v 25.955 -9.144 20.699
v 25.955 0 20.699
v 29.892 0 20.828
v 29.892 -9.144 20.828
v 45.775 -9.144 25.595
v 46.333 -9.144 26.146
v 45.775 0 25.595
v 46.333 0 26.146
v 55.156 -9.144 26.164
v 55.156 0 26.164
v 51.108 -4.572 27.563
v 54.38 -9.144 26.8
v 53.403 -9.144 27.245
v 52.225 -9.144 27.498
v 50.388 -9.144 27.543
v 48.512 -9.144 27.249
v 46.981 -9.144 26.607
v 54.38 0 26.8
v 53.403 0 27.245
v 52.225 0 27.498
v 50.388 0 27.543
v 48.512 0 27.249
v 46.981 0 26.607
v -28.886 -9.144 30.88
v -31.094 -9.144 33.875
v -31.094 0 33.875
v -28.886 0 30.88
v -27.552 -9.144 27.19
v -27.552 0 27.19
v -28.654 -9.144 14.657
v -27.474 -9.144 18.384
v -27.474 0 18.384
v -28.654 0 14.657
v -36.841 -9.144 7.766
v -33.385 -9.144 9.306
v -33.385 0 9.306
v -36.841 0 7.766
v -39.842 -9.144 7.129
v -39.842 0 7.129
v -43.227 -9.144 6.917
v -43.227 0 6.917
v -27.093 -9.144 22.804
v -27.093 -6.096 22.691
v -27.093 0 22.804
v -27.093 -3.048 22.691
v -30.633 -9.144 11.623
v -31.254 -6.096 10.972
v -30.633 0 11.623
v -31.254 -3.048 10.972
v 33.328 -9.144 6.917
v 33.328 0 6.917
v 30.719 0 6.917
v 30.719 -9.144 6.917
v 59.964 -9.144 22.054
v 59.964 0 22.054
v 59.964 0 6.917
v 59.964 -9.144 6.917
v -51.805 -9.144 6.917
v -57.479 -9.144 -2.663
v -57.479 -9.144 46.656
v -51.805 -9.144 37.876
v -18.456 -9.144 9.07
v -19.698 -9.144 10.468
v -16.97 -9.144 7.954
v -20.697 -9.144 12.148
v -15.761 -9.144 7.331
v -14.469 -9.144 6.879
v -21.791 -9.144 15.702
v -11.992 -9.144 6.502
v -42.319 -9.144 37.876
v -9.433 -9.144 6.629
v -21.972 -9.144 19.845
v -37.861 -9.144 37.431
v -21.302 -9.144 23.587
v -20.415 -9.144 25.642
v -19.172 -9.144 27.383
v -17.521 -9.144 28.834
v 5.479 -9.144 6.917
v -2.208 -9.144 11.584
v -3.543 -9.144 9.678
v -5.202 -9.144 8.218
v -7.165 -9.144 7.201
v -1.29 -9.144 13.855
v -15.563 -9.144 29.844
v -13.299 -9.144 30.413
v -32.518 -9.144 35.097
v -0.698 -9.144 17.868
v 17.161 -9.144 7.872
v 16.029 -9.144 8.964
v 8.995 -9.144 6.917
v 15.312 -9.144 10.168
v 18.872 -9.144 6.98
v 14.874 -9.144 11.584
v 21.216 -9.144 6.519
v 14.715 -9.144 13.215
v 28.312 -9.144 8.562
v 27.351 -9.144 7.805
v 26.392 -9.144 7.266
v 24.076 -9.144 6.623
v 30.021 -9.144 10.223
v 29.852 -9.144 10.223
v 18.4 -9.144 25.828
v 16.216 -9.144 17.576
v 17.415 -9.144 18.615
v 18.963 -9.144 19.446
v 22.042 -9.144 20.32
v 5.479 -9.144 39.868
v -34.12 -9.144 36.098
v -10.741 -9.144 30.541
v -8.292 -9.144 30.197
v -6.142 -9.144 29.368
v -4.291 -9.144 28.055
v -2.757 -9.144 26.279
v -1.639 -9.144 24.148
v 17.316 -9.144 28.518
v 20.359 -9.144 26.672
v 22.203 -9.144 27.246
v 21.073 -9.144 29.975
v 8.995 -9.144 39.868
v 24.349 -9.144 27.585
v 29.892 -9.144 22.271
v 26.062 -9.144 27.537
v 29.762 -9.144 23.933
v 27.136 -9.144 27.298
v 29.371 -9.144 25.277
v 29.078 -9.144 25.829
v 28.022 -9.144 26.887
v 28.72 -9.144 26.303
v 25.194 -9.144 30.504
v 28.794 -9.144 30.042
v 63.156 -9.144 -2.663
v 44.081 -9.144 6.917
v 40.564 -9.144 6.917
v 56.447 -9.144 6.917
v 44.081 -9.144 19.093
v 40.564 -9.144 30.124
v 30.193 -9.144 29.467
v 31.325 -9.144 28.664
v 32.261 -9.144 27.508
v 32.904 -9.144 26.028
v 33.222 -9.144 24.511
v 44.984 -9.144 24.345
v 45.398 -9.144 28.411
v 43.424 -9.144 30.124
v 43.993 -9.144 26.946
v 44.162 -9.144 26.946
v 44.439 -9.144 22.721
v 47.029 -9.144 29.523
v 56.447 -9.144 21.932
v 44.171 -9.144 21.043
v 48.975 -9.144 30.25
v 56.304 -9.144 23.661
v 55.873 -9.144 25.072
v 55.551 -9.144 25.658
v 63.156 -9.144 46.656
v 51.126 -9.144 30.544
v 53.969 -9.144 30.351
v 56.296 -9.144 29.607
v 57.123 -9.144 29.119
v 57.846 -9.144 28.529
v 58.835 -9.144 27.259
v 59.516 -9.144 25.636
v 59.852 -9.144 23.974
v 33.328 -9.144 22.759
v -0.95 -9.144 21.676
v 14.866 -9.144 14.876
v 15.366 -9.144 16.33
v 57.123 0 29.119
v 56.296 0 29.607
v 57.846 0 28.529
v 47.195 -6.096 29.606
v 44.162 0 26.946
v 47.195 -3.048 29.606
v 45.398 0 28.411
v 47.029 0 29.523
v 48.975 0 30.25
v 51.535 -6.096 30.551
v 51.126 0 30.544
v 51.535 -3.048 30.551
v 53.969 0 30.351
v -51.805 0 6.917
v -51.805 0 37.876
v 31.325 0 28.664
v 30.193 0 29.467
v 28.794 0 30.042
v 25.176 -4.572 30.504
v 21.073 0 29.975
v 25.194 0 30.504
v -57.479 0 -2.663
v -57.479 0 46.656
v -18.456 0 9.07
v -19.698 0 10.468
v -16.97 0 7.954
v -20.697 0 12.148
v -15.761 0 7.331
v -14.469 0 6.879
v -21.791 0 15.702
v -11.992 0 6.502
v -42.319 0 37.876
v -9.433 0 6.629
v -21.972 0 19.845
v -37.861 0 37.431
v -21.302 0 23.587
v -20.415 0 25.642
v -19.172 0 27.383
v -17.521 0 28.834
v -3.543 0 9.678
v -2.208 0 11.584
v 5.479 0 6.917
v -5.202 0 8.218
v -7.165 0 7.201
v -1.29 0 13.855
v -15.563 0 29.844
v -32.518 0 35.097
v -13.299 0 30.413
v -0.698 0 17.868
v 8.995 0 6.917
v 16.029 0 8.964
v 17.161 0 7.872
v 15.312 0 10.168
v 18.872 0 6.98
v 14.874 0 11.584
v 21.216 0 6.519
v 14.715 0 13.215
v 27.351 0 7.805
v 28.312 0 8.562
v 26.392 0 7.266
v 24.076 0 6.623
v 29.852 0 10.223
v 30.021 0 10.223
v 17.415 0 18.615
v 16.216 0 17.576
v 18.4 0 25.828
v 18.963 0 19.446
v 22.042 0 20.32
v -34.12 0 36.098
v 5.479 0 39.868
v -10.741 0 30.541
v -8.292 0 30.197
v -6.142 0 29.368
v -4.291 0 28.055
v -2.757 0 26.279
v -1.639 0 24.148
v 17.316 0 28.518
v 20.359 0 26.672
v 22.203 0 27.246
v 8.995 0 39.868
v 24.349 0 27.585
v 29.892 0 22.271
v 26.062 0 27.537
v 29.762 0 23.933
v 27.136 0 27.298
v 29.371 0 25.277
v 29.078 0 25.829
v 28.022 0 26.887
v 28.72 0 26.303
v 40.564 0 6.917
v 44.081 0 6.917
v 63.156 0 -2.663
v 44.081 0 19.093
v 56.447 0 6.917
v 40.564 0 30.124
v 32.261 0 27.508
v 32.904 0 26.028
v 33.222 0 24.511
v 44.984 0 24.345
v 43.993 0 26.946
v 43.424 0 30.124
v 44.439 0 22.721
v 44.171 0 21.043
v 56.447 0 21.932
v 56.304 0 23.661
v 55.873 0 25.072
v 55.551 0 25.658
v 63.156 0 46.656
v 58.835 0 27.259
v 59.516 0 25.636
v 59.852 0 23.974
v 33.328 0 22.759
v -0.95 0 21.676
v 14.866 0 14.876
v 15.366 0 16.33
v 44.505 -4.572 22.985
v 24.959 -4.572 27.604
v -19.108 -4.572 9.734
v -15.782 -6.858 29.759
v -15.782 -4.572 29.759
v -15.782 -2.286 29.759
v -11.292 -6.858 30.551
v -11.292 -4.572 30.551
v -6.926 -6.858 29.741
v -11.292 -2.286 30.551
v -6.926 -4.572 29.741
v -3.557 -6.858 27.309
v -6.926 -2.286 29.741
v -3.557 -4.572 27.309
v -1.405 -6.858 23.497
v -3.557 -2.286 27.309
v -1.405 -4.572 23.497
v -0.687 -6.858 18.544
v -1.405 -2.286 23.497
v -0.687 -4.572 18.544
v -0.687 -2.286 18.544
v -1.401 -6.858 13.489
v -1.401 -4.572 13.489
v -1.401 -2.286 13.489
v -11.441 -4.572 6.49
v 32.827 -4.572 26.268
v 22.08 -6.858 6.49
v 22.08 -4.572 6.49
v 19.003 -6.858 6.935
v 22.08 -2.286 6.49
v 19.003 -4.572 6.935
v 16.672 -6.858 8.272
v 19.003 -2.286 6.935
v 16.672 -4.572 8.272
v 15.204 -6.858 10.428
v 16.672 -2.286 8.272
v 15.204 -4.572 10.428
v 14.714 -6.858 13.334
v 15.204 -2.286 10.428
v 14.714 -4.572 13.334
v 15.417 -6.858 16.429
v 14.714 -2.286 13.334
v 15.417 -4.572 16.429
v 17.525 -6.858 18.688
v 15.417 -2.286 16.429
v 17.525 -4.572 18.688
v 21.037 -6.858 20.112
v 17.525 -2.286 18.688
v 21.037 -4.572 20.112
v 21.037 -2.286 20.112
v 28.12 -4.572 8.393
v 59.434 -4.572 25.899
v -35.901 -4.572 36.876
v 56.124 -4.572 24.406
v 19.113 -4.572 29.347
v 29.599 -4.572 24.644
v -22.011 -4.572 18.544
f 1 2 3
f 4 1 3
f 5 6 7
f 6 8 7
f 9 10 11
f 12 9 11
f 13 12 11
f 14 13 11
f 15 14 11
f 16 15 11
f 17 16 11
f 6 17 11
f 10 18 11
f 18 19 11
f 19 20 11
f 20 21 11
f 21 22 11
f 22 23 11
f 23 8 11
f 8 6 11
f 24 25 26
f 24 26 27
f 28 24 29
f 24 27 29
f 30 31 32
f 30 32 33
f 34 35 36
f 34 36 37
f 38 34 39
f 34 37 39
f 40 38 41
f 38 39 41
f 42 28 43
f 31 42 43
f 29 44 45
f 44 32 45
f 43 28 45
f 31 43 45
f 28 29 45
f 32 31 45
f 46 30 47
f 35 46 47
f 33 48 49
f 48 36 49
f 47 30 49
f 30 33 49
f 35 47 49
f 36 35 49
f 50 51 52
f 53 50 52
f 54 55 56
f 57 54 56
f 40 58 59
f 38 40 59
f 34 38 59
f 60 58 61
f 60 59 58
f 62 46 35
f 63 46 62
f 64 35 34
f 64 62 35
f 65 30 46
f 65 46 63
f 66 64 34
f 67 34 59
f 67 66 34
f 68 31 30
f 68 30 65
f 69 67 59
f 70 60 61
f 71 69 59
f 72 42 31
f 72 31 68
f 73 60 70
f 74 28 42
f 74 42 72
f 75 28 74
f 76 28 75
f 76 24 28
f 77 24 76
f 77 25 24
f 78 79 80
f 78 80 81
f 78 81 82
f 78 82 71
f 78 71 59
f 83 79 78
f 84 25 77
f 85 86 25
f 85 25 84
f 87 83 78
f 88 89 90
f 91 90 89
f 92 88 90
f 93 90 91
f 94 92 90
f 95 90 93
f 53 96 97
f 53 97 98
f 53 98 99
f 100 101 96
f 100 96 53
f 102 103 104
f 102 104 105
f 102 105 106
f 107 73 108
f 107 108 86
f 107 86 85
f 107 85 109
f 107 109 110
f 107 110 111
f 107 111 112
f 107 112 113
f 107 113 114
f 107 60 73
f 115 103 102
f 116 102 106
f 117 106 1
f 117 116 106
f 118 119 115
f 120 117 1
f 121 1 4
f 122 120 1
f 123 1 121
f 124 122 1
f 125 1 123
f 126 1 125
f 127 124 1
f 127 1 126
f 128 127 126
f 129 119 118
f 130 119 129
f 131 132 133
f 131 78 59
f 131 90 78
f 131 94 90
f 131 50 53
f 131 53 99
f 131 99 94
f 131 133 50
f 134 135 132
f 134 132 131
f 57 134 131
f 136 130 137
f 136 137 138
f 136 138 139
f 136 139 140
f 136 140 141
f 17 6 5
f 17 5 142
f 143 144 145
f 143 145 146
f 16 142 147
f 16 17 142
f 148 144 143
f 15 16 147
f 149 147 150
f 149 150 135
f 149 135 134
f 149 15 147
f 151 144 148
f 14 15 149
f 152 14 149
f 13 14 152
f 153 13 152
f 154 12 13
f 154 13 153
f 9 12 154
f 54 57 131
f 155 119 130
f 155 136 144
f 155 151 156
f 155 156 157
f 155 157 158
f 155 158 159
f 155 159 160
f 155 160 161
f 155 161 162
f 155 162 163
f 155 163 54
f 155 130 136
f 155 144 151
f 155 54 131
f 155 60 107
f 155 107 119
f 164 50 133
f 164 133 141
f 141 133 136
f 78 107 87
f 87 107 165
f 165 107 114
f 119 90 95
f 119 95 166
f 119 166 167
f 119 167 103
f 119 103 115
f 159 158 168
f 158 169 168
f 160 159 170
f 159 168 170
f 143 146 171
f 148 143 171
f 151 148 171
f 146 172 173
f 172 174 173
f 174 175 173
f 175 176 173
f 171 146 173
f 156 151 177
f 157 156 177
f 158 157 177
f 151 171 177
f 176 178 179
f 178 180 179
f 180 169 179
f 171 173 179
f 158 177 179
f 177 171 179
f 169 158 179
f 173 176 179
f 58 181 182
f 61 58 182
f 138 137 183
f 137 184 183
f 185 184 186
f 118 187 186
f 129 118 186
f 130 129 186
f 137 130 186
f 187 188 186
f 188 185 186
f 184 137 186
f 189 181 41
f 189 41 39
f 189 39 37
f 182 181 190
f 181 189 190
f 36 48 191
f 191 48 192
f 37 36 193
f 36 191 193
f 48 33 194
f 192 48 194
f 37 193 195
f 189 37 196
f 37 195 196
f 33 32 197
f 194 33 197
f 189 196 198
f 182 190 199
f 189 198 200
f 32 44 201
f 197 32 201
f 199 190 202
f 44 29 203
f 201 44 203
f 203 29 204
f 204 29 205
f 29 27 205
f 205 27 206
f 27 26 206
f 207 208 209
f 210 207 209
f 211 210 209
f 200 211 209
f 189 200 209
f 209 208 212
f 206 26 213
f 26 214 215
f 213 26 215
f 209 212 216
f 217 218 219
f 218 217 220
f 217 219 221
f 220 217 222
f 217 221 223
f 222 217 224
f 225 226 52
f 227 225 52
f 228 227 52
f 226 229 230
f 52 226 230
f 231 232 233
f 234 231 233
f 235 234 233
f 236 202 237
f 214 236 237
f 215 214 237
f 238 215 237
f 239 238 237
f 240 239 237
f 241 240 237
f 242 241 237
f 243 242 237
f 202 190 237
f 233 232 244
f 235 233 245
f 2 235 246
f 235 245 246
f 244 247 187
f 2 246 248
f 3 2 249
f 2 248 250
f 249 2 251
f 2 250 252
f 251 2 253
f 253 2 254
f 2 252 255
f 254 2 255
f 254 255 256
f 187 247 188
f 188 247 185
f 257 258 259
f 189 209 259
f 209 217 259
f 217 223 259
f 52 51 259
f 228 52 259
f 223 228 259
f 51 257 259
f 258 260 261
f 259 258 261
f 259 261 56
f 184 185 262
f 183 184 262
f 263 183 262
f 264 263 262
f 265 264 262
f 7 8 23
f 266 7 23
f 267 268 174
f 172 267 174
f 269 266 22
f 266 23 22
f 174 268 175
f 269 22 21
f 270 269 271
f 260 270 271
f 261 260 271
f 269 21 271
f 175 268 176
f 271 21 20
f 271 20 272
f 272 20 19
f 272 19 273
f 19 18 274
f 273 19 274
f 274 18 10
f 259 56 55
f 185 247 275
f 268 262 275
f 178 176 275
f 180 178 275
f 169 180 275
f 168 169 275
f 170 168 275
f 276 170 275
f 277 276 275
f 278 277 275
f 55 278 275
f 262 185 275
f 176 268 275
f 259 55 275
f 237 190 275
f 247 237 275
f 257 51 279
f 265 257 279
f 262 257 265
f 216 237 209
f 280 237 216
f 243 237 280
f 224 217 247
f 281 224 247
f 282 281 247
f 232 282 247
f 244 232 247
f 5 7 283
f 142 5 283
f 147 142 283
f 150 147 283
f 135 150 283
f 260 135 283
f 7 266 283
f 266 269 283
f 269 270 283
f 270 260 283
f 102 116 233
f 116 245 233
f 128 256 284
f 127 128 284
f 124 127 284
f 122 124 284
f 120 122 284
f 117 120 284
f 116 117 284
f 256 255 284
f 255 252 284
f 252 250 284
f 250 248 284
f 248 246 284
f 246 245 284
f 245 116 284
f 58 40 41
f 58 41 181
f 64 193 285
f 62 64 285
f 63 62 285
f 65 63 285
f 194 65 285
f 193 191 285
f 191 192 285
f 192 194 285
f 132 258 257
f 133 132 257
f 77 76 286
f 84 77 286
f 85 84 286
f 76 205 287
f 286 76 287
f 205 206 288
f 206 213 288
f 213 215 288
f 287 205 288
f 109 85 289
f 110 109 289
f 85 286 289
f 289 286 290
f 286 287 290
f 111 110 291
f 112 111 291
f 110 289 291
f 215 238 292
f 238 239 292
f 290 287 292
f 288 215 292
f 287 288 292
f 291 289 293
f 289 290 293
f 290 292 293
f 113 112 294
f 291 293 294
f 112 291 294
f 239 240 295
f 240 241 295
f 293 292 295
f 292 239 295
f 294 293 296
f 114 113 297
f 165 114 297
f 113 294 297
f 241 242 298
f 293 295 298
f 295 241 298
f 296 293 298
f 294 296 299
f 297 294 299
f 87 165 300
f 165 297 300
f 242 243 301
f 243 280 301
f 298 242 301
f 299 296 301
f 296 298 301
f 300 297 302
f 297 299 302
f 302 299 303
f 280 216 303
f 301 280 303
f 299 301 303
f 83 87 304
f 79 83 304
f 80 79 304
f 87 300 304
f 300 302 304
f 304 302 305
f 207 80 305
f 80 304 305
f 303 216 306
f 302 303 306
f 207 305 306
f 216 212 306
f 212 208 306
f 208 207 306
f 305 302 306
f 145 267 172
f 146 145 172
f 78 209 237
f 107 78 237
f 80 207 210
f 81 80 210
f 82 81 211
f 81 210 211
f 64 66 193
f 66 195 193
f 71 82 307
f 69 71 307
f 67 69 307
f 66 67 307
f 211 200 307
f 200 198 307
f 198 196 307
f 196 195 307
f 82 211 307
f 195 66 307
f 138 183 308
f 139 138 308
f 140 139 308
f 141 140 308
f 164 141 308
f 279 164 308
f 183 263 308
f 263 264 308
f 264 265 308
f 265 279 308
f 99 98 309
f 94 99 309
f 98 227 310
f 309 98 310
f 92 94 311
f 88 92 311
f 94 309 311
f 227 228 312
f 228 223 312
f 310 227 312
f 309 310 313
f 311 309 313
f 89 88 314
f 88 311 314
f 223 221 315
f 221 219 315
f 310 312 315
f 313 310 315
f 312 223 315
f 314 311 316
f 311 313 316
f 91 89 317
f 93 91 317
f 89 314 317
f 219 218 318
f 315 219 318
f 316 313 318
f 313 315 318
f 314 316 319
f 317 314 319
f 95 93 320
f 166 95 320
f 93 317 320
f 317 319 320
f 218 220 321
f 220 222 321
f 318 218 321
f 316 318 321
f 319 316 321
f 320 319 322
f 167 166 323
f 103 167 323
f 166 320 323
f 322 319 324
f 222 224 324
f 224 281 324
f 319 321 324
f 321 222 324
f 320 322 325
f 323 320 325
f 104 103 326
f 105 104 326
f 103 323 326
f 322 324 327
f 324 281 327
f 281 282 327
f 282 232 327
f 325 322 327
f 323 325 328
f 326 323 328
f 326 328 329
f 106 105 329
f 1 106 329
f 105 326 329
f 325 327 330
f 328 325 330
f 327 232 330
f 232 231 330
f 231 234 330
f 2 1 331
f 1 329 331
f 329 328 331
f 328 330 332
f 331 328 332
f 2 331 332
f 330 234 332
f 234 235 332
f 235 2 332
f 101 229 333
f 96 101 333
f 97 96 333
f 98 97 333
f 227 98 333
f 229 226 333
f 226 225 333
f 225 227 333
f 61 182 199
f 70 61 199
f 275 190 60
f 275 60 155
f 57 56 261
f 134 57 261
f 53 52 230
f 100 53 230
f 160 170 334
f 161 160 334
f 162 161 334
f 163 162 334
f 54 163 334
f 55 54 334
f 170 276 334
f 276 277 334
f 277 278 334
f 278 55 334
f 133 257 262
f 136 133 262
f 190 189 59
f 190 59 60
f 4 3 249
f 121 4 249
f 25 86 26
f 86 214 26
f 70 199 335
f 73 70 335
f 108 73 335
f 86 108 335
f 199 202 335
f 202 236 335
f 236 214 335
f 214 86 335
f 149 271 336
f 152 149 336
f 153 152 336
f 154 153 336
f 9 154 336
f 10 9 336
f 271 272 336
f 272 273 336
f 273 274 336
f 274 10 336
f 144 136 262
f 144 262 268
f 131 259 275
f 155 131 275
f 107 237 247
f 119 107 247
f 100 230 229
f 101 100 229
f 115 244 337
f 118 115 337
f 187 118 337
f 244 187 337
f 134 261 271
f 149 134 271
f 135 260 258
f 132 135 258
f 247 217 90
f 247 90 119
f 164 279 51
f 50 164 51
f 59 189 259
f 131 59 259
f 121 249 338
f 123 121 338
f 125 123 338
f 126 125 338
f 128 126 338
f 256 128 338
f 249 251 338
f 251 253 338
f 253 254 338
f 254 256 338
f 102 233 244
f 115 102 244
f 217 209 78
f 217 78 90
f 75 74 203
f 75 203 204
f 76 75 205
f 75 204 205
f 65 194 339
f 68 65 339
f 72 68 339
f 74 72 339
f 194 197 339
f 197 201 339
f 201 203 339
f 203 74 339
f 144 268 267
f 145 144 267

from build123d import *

# Parameters (mm, degrees)
F0_W     = 120.6359267235
F0_H     = 49.3188030086
F0_W_2   = 3.5166996237
F0_H_2   = 32.9512721967
F1_DEPTH = 9.144


with BuildPart() as f1:
    # F0 (on Front) → F1 (new body)
    with BuildSketch(Plane.XZ):
        with Locations((2.8384923935, 21.9962981064)):
            Rectangle(F0_W, F0_H)
        with BuildLine():
            add(Edge.make_bspline(
                [(-3.5570494323, 27.3089231075), (-0.687449643, 24.0666480209), (-0.687449643, 18.5442777062)],
                knots=[0, 0, 0, 1, 1, 1], degree=2))
            add(Edge.make_bspline(
                [(-0.687449643, 18.5442777062), (-0.687449643, 12.8660613581), (-3.5434976033, 9.6779935875)],
                knots=[0, 0, 0, 1, 1, 1], degree=2))
            add(Edge.make_bspline(
                [(-3.5434976033, 9.6779935875), (-6.3995455636, 6.4899258168), (-11.440825949, 6.4899258168)],
                knots=[0, 0, 0, 1, 1, 1], degree=2))
            add(Edge.make_bspline(
                [(-11.440825949, 6.4899258168), (-14.5577466175, 6.4899258168), (-16.9699721782, 7.9535233481)],
                knots=[0, 0, 0, 1, 1, 1], degree=2))
            add(Edge.make_bspline(
                [(-16.9699721782, 7.9535233481), (-19.382197739, 9.4171208793), (-20.6967251513, 12.1478144214)],
                knots=[0, 0, 0, 1, 1, 1], degree=2))
            add(Edge.make_bspline(
                [(-20.6967251513, 12.1478144214), (-22.0112525637, 14.8785079636), (-22.0112525637, 18.5442777062)],
                knots=[0, 0, 0, 1, 1, 1], degree=2))
            add(Edge.make_bspline(
                [(-22.0112525637, 18.5442777062), (-22.0112525637, 24.2157181398), (-19.1721443896, 27.3834581669)],
                knots=[0, 0, 0, 1, 1, 1], degree=2))
            add(Edge.make_bspline(
                [(-19.1721443896, 27.3834581669), (-16.3330362156, 30.5511981941), (-11.2917558301, 30.5511981941)],
                knots=[0, 0, 0, 1, 1, 1], degree=2))
            add(Edge.make_bspline(
                [(-11.2917558301, 30.5511981941), (-6.4266492216, 30.5511981941), (-3.5570494323, 27.3089231075)],
                knots=[0, 0, 0, 1, 1, 1], degree=2))
        make_face(mode=Mode.SUBTRACT)
        with BuildLine():
            Line((33.3276411297, 6.9168084301), (30.7189140485, 6.9168084301))
            Line((30.7189140485, 6.9168084301), (30.0209948554, 10.2234547044))
            Line((30.0209948554, 10.2234547044), (29.851596993, 10.2234547044))
            add(Edge.make_bspline(
                [(29.851596993, 10.2234547044), (28.1169628818, 8.0416102365), (26.3924926425, 7.2657680267)],
                knots=[0, 0, 0, 1, 1, 1], degree=2))
            add(Edge.make_bspline(
                [(26.3924926425, 7.2657680267), (24.6680224031, 6.4899258168), (22.0796230654, 6.4899258168)],
                knots=[0, 0, 0, 1, 1, 1], degree=2))
            add(Edge.make_bspline(
                [(22.0796230654, 6.4899258168), (18.6306825867, 6.4899258168), (16.6724432972, 8.2719913294)],
                knots=[0, 0, 0, 1, 1, 1], degree=2))
            add(Edge.make_bspline(
                [(16.6724432972, 8.2719913294), (14.7142040077, 10.054056842), (14.7142040077, 13.3335994583)],
                knots=[0, 0, 0, 1, 1, 1], degree=2))
            add(Edge.make_bspline(
                [(14.7142040077, 13.3335994583), (14.7142040077, 20.3602227913), (25.9554461574, 20.6990185161)],
                knots=[0, 0, 0, 1, 1, 1], degree=2))
            Line((25.9554461574, 20.6990185161), (29.8922524799, 20.8277608915))
            Line((29.8922524799, 20.8277608915), (29.8922524799, 22.2710306793))
            add(Edge.make_bspline(
                [(29.8922524799, 22.2710306793), (29.8922524799, 25.0017242214), (28.720019272, 26.3026998047)],
                knots=[0, 0, 0, 1, 1, 1], degree=2))
            add(Edge.make_bspline(
                [(28.720019272, 26.3026998047), (27.5477860641, 27.6036753881), (24.9593867264, 27.6036753881)],
                knots=[0, 0, 0, 1, 1, 1], degree=2))
            add(Edge.make_bspline(
                [(24.9593867264, 27.6036753881), (22.0592953219, 27.6036753881), (18.4003014938, 25.82838579)],
                knots=[0, 0, 0, 1, 1, 1], degree=2))
            Line((18.4003014938, 25.82838579), (17.3161551743, 28.5184238451))
            add(Edge.make_bspline(
                [(17.3161551743, 28.5184238451), (19.030461542, 29.4467241311), (21.0733997627, 29.9752454619)],
                knots=[0, 0, 0, 1, 1, 1], degree=2))
            add(Edge.make_bspline(
                [(21.0733997627, 29.9752454619), (23.1163379834, 30.5037667926), (25.1762159903, 30.5037667926)],
                knots=[0, 0, 0, 1, 1, 1], degree=2))
            add(Edge.make_bspline(
                [(25.1762159903, 30.5037667926), (29.3230756622, 30.5037667926), (31.325358396, 28.6641060068)],
                knots=[0, 0, 0, 1, 1, 1], degree=2))
            add(Edge.make_bspline(
                [(31.325358396, 28.6641060068), (33.3276411297, 26.824445221), (33.3276411297, 22.7588965231)],
                knots=[0, 0, 0, 1, 1, 1], degree=2))
            Line((33.3276411297, 22.7588965231), (33.3276411297, 6.9168084301))
        make_face(mode=Mode.SUBTRACT)
        with BuildLine():
            Line((59.9637610157, 6.9168084301), (56.4470613919, 6.9168084301))
            Line((56.4470613919, 6.9168084301), (56.4470613919, 21.9322349545))
            add(Edge.make_bspline(
                [(56.4470613919, 21.9322349545), (56.4470613919, 24.764567214), (55.1562496803, 26.1637935576)],
                knots=[0, 0, 0, 1, 1, 1], degree=2))
            add(Edge.make_bspline(
                [(55.1562496803, 26.1637935576), (53.8654379688, 27.5630199011), (51.1076407687, 27.5630199011)],
                knots=[0, 0, 0, 1, 1, 1], degree=2))
            add(Edge.make_bspline(
                [(51.1076407687, 27.5630199011), (47.468974684, 27.5630199011), (45.7749960599, 25.5946167399)],
                knots=[0, 0, 0, 1, 1, 1], degree=2))
            add(Edge.make_bspline(
                [(45.7749960599, 25.5946167399), (44.0810174357, 23.6262135786), (44.0810174357, 19.0931267804)],
                knots=[0, 0, 0, 1, 1, 1], degree=2))
            Line((44.0810174357, 19.0931267804), (44.0810174357, 6.9168084301))
            Line((44.0810174357, 6.9168084301), (40.564317812, 6.9168084301))
            Line((40.564317812, 6.9168084301), (40.564317812, 30.1243155808))
            Line((40.564317812, 30.1243155808), (43.4237537296, 30.1243155808))
            Line((43.4237537296, 30.1243155808), (43.9929305473, 26.9464116819))
            Line((43.9929305473, 26.9464116819), (44.1623284097, 26.9464116819))
            add(Edge.make_bspline(
                [(44.1623284097, 26.9464116819), (45.2464747291, 28.6607180495), (47.1945501469, 29.6059581218)],
                knots=[0, 0, 0, 1, 1, 1], degree=2))
            add(Edge.make_bspline(
                [(47.1945501469, 29.6059581218), (49.1426255647, 30.5511981941), (51.5345233819, 30.5511981941)],
                knots=[0, 0, 0, 1, 1, 1], degree=2))
            add(Edge.make_bspline(
                [(51.5345233819, 30.5511981941), (55.7288144553, 30.5511981941), (57.8462877355, 28.5285877169)],
                knots=[0, 0, 0, 1, 1, 1], degree=2))
            add(Edge.make_bspline(
                [(57.8462877355, 28.5285877169), (59.9637610157, 26.5059772396), (59.9637610157, 22.0542014154)],
                knots=[0, 0, 0, 1, 1, 1], degree=2))
            Line((59.9637610157, 22.0542014154), (59.9637610157, 6.9168084301))
        make_face(mode=Mode.SUBTRACT)
        with BuildLine():
            add(Edge.make_bspline(
                [(-31.0943659463, 33.8747842546), (-27.0931884361, 29.8736067444), (-27.0931884361, 22.6911373781)],
                knots=[0, 0, 0, 1, 1, 1], degree=2))
            add(Edge.make_bspline(
                [(-27.0931884361, 22.6911373781), (-27.0931884361, 15.0275780825), (-31.253599937, 10.9721932563)],
                knots=[0, 0, 0, 1, 1, 1], degree=2))
            add(Edge.make_bspline(
                [(-31.253599937, 10.9721932563), (-35.4140114379, 6.9168084301), (-43.2266408524, 6.9168084301)],
                knots=[0, 0, 0, 1, 1, 1], degree=2))
            Line((-43.2266408524, 6.9168084301), (-51.804948605, 6.9168084301))
            Line((-51.804948605, 6.9168084301), (-51.804948605, 37.8759617649))
            Line((-51.804948605, 37.8759617649), (-42.3186683098, 37.8759617649))
            add(Edge.make_bspline(
                [(-42.3186683098, 37.8759617649), (-35.0955434565, 37.8759617649), (-31.0943659463, 33.8747842546)],
                knots=[0, 0, 0, 1, 1, 1], degree=2))
        make_face(mode=Mode.SUBTRACT)
        with Locations((7.2369823607, 23.3924445285)):
            Rectangle(F0_W_2, F0_H_2, mode=Mode.SUBTRACT)
    extrude(amount=F1_DEPTH)


solid = f1.part
